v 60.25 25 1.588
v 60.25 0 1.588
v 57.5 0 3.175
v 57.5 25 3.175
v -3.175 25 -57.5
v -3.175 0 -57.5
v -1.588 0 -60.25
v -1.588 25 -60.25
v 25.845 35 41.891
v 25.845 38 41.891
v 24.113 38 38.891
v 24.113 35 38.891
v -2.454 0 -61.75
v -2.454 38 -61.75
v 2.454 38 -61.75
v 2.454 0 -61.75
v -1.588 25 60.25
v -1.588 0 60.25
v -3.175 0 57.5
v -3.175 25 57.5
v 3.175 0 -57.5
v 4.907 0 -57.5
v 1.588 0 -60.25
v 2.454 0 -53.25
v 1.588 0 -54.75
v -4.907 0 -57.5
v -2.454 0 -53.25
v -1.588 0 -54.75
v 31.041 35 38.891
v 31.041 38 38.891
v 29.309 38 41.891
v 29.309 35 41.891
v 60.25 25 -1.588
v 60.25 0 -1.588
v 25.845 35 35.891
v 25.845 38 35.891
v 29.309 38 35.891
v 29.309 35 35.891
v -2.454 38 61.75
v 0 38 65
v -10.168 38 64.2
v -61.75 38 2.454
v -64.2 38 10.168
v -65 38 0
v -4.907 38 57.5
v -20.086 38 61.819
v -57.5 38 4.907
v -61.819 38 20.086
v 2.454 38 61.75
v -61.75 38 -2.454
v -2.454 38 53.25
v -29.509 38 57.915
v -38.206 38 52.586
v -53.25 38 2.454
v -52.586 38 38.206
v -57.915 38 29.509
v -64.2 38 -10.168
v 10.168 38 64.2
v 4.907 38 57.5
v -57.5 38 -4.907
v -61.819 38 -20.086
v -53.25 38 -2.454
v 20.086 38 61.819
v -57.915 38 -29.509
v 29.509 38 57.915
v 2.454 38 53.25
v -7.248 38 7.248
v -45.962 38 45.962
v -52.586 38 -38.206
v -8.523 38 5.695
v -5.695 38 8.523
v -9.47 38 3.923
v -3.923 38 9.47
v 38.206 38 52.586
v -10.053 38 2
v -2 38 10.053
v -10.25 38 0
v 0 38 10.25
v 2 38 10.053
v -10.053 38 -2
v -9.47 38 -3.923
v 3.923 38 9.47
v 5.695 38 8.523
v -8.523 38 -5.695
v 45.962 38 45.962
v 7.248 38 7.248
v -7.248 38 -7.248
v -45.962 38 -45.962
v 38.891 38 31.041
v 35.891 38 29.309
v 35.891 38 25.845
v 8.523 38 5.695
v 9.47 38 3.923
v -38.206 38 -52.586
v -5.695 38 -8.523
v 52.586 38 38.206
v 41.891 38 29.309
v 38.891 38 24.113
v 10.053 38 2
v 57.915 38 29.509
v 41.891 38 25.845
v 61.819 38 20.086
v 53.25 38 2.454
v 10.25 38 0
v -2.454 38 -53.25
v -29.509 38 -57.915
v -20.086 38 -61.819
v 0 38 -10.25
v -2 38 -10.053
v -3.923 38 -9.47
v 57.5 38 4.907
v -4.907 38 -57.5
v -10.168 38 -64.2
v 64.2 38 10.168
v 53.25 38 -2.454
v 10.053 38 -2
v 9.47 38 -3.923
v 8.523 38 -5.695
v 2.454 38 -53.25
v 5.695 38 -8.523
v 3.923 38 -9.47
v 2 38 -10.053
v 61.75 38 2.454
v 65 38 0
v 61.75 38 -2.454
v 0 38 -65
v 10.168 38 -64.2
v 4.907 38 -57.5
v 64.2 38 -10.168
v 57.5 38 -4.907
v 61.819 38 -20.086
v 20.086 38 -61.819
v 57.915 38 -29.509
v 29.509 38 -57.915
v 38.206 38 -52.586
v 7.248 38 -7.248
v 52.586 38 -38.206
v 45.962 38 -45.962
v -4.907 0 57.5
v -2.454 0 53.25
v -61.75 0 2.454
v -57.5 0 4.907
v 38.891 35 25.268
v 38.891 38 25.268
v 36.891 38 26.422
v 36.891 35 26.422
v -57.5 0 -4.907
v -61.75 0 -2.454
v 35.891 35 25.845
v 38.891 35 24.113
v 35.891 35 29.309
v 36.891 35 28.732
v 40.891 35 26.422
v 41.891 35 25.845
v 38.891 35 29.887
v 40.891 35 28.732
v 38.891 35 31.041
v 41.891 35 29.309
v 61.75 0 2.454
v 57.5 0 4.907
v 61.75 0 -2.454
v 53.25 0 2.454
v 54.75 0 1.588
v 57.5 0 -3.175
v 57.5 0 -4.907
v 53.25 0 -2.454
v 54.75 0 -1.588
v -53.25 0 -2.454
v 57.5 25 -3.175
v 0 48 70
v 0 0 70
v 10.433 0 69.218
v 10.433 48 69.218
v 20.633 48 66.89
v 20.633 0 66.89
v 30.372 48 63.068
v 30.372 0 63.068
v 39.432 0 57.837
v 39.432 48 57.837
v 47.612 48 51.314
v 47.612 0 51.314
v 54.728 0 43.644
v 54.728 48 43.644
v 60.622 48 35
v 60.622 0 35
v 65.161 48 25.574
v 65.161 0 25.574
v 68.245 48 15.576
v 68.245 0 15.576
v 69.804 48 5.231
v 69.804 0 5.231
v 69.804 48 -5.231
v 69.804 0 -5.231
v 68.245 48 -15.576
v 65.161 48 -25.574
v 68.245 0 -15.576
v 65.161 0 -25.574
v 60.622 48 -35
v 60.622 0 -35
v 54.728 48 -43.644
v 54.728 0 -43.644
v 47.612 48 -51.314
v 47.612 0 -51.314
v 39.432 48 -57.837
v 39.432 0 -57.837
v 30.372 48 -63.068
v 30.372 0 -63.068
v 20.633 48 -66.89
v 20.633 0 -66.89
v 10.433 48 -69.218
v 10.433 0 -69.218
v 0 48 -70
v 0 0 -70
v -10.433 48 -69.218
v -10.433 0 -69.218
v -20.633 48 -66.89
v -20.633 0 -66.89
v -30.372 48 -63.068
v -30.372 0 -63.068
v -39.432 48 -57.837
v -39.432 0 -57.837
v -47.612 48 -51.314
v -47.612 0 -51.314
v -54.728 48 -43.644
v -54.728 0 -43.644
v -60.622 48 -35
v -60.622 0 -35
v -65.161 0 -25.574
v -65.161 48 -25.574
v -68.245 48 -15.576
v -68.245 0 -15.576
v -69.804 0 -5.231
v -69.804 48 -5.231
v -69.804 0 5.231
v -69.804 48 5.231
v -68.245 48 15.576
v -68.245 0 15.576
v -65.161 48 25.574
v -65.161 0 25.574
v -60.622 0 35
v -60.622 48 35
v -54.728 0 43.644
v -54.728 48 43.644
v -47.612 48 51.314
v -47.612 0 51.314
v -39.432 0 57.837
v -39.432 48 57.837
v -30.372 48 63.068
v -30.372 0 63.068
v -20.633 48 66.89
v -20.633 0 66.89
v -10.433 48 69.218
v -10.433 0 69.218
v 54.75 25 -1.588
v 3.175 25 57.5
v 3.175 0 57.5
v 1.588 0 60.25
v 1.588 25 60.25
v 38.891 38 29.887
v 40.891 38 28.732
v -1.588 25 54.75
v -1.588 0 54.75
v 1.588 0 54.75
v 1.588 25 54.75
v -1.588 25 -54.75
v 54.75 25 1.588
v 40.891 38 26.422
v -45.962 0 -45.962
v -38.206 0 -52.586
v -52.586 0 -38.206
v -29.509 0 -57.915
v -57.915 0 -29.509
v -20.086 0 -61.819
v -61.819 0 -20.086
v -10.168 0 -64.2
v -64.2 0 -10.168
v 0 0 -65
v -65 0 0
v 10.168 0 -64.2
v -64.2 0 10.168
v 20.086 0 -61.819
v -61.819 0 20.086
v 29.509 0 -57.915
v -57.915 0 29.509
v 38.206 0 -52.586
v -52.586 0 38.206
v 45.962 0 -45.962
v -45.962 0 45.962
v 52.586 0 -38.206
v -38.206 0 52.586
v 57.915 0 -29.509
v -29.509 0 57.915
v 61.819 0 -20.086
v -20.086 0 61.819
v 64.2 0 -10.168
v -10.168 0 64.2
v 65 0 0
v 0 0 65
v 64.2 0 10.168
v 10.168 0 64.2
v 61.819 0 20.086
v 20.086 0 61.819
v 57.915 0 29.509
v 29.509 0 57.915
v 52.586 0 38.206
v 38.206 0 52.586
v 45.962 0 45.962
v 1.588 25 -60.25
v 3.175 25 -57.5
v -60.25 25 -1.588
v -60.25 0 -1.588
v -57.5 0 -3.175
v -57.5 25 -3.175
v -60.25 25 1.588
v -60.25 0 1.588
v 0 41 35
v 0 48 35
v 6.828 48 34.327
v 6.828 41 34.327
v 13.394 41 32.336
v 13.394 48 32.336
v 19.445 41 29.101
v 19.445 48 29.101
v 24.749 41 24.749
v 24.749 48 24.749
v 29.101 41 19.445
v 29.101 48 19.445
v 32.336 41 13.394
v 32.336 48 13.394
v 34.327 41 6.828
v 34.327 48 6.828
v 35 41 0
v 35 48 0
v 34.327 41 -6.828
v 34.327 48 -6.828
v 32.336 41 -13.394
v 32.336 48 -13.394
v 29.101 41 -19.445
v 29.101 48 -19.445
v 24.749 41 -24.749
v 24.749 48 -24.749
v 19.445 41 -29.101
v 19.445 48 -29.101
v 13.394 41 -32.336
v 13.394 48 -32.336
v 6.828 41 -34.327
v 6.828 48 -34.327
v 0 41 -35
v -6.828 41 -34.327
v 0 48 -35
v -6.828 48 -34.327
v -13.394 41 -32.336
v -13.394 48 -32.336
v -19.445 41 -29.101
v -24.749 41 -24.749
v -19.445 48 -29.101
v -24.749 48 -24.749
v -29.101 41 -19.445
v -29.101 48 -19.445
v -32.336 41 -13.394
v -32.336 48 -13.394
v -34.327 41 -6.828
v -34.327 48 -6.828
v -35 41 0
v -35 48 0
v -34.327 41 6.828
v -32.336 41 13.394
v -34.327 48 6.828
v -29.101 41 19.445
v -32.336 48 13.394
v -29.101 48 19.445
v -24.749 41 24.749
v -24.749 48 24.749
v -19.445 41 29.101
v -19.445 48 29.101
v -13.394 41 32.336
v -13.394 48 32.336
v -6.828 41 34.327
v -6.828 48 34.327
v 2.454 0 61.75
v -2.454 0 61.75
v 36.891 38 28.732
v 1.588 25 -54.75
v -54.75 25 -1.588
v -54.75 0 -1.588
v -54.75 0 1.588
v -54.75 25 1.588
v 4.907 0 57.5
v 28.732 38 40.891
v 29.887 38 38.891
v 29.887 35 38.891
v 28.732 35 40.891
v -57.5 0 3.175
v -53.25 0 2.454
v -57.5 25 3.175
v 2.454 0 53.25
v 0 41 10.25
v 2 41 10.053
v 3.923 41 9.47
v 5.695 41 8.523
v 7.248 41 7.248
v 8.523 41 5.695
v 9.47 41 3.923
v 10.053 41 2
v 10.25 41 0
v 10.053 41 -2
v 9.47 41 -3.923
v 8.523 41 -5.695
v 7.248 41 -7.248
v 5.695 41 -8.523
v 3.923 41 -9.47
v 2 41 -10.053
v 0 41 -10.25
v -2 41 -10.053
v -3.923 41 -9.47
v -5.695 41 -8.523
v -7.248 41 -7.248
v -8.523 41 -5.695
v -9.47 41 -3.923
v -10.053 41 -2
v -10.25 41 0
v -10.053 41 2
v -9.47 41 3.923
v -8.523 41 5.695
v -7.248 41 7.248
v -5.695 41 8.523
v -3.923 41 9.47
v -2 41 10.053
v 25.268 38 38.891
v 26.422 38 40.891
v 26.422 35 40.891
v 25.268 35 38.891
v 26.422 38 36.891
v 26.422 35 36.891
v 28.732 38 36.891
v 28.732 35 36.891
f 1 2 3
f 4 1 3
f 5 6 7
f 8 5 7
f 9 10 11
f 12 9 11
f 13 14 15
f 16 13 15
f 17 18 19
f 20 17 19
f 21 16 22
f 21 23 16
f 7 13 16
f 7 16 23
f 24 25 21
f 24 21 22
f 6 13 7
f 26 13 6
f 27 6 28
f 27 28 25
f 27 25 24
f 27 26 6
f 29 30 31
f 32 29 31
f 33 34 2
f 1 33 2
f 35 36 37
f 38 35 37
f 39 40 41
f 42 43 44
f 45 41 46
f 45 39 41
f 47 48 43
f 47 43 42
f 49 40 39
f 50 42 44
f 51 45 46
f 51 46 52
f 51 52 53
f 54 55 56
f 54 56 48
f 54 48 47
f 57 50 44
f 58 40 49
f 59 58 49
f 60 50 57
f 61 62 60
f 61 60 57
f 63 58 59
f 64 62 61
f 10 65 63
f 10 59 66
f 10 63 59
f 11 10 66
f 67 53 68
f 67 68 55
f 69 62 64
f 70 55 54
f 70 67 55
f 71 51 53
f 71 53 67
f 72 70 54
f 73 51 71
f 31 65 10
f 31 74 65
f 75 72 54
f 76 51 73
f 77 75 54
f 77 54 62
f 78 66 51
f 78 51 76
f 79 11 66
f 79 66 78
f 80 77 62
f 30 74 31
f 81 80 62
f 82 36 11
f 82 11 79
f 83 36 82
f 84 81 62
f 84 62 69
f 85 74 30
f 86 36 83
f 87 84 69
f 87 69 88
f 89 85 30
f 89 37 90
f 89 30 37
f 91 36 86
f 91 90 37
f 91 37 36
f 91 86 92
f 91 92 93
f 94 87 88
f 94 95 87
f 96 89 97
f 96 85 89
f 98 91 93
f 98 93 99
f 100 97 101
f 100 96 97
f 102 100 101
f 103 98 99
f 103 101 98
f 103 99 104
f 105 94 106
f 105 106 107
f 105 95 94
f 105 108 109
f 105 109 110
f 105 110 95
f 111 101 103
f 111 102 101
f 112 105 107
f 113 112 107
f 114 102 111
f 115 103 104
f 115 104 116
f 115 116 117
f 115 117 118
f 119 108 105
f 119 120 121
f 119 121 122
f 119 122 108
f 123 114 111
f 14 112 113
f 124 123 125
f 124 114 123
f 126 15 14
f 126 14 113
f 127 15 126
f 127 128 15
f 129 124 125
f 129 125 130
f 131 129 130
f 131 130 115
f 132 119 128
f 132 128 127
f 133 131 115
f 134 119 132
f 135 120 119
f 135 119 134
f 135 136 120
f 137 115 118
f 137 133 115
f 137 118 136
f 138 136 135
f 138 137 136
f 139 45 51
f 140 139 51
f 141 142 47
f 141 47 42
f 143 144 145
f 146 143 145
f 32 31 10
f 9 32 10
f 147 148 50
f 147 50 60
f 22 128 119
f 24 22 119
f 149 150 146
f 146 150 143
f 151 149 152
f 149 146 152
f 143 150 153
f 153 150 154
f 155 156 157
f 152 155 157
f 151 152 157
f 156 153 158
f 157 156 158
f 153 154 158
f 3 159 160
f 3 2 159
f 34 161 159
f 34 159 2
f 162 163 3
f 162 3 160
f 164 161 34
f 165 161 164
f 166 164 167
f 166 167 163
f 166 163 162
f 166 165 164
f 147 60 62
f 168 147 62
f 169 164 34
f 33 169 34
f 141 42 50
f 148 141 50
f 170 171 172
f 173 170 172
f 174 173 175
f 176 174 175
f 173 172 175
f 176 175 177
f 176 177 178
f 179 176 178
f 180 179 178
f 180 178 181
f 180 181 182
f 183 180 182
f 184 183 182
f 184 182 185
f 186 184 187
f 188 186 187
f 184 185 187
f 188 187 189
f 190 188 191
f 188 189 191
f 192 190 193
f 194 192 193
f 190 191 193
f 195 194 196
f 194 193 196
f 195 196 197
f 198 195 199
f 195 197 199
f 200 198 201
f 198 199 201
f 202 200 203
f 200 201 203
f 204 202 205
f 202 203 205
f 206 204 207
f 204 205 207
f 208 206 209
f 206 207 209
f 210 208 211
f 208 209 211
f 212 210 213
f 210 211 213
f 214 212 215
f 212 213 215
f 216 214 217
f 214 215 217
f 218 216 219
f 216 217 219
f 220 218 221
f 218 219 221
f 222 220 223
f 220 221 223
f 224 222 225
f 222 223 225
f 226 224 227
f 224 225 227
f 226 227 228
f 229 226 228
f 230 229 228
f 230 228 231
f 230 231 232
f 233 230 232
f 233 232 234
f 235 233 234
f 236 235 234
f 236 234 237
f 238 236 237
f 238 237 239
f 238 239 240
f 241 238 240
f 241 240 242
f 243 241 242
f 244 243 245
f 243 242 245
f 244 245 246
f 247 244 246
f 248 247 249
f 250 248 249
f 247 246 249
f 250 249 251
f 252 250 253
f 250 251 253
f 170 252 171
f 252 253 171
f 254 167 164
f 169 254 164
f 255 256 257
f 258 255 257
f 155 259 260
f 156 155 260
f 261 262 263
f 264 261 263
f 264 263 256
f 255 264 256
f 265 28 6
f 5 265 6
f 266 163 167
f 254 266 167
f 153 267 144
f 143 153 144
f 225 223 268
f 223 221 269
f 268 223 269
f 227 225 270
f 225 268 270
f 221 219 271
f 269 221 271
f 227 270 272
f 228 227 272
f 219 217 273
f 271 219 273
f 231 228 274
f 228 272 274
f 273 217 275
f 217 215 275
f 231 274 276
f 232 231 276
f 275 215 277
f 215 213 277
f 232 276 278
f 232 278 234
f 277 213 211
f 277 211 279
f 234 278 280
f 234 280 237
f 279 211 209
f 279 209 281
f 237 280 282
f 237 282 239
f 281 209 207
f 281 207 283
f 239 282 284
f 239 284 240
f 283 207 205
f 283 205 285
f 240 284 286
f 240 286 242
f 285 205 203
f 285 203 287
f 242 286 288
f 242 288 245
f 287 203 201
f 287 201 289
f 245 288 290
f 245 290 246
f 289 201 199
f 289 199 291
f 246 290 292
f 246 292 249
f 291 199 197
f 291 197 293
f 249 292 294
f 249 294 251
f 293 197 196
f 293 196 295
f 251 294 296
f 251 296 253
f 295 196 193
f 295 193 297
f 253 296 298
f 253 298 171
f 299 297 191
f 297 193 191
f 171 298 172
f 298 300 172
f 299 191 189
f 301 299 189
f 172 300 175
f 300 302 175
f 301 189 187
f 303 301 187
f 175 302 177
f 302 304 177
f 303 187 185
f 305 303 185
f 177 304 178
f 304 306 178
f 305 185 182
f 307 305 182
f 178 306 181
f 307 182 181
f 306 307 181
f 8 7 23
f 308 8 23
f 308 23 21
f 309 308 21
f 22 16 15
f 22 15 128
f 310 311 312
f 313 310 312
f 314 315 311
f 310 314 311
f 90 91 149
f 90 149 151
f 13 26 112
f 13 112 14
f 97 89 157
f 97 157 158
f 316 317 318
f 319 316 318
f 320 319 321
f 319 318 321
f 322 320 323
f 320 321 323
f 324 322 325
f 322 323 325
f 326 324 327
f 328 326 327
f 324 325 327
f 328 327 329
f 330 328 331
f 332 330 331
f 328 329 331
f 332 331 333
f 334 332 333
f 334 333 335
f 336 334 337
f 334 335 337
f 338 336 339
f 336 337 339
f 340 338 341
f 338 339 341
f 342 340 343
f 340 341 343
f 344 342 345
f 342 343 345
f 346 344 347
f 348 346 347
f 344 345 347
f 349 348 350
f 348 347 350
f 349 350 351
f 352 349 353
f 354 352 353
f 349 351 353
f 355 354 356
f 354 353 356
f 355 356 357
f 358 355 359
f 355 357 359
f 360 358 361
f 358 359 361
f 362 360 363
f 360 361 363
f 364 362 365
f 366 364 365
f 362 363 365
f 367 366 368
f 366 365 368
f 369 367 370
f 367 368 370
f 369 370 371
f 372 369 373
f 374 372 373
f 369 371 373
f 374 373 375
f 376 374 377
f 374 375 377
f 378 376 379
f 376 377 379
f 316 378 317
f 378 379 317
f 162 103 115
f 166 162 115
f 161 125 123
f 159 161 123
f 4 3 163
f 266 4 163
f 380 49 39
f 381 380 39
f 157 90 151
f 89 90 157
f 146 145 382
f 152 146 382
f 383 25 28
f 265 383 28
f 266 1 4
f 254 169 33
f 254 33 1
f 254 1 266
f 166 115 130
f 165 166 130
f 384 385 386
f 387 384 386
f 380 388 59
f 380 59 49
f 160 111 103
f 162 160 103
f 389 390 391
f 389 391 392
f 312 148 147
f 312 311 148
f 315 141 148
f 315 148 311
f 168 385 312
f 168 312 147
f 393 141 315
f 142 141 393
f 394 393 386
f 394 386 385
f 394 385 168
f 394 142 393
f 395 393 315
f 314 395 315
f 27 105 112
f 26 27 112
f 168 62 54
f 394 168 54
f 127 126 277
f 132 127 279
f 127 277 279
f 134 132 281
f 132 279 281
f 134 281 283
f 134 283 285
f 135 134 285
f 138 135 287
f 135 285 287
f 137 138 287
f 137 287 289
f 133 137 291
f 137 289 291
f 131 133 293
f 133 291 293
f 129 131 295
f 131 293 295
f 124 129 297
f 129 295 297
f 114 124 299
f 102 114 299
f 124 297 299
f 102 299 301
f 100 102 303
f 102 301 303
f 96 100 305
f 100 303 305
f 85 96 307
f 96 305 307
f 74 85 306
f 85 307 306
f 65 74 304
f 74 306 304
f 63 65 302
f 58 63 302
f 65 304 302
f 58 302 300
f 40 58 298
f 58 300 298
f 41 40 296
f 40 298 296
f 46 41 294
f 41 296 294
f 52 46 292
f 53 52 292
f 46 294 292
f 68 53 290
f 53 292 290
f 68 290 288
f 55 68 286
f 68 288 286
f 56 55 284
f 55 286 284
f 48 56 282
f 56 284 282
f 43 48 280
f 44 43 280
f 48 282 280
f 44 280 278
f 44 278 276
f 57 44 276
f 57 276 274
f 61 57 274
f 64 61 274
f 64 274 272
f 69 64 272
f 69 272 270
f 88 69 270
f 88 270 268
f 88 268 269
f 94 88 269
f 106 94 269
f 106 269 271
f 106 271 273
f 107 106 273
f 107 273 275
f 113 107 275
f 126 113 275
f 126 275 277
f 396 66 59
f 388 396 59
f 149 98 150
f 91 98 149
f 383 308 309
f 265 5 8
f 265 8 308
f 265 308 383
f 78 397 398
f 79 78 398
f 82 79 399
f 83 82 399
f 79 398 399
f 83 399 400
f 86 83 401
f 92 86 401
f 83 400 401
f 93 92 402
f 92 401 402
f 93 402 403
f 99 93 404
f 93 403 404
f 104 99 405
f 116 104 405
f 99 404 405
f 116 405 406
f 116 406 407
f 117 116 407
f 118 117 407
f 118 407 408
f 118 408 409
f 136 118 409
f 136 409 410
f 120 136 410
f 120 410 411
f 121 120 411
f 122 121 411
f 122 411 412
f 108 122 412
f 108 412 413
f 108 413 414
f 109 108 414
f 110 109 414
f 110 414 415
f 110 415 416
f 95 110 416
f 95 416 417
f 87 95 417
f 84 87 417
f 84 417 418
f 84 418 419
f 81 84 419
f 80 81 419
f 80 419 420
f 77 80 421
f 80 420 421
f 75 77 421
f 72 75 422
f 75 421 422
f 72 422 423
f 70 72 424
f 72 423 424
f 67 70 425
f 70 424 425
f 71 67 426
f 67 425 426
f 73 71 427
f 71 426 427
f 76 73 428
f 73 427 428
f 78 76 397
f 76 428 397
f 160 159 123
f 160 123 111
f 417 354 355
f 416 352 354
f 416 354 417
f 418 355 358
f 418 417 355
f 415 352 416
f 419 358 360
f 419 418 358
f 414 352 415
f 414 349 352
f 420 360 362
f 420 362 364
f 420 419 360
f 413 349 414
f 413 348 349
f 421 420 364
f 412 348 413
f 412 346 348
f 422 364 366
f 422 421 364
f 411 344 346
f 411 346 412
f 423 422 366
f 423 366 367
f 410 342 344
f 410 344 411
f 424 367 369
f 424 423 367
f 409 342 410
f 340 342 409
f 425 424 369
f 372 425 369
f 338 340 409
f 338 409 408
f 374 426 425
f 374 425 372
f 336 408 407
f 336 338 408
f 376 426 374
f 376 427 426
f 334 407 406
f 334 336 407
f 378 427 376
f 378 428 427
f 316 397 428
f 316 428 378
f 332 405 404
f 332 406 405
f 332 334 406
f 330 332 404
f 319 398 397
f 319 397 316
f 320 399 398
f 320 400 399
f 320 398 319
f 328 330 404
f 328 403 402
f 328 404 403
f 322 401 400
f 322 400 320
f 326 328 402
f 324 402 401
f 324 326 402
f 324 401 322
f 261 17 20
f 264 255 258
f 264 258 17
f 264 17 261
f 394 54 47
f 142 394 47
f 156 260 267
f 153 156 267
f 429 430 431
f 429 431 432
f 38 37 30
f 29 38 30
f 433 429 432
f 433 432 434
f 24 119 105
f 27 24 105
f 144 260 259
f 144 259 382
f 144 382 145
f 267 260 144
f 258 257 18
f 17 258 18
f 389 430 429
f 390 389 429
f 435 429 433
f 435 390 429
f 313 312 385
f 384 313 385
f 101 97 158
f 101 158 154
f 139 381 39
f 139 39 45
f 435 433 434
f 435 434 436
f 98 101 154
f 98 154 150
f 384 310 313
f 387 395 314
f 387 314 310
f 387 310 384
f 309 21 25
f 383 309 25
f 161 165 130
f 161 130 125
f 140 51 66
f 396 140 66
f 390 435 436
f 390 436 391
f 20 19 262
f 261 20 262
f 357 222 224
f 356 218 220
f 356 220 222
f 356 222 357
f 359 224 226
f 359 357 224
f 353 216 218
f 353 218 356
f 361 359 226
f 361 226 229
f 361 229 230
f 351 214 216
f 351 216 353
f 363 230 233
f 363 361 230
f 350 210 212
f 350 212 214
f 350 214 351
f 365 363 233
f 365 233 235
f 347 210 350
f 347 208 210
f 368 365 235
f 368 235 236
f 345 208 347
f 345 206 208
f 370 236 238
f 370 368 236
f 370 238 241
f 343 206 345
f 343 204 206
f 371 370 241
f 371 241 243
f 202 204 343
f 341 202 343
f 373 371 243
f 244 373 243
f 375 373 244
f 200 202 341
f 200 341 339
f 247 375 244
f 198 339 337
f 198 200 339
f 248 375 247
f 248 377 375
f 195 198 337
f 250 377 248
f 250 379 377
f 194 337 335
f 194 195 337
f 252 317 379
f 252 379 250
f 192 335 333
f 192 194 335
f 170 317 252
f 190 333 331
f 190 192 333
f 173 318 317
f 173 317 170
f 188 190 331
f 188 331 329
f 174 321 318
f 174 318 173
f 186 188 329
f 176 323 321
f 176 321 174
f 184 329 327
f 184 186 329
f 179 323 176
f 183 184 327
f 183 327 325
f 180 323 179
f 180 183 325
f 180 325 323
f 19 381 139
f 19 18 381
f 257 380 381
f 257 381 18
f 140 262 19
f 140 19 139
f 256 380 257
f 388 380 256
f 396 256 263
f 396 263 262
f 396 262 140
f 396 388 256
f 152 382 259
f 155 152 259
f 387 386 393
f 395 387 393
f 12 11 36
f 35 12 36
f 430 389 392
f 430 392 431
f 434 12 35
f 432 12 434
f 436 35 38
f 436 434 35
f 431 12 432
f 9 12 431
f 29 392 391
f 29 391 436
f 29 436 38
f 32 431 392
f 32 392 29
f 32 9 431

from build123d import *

# Parameters (mm, degrees)
SKETCH1_R           = 70
BOSS_EXTRUDE1_DEPTH = 48
SKETCH2_R           = 35
CUT_EXTRUDE1_DEPTH  = 7
SKETCH3_R           = 10.25
CUT_EXTRUDE2_DEPTH  = 108.14942837
SKETCH4_R           = 65
CUT_EXTRUDE4_DEPTH  = 38
BOSS_EXTRUDE2_DEPTH = 38
CUT_EXTRUDE5_DEPTH  = 25
CIRPATTERN1_COUNT   = 4
BOSS_EXTRUDE3_DEPTH = 3


with BuildPart() as part:
    # Sketch1 → Boss-Extrude1 (new body)
    with BuildSketch(Plane(origin=(0, 0, 0), x_dir=(1, 0, 0), z_dir=(0, 1, 0))):
        with Locations(Location((0, 0, 0), (0, 0, 270))):
            Circle(SKETCH1_R)
    extrude(amount=BOSS_EXTRUDE1_DEPTH)

    # Sketch2 → Cut-Extrude1 (cut)
    with BuildSketch(Plane(origin=(0, 48, 0), x_dir=(1, 0, 0), z_dir=(0, 1, 0))):
        with Locations(Location((0, 0, 0), (0, 0, 270))):
            Circle(SKETCH2_R)
    extrude(amount=-CUT_EXTRUDE1_DEPTH, mode=Mode.SUBTRACT)

    # Sketch3 → Cut-Extrude2 (cut, through all)
    with BuildSketch(Plane(origin=(0, 41, 0), x_dir=(1, 0, 0), z_dir=(0, 1, 0))):
        with Locations(Location((0, 0, 0), (0, 0, 270))):
            Circle(SKETCH3_R)
    extrude(amount=-CUT_EXTRUDE2_DEPTH, mode=Mode.SUBTRACT)

    # Sketch4 → Cut-Extrude4 (cut)
    with BuildSketch(Plane.XZ):
        with Locations(Location((0, 0, 0), (0, 0, 270))):
            Circle(SKETCH4_R)
    extrude(amount=-CUT_EXTRUDE4_DEPTH, mode=Mode.SUBTRACT)

    # Sketch7 → Boss-Extrude2 (add)
    with BuildSketch(Plane.XZ.offset(-38)):
        Polygon((-57.5, 4.907477288), (-61.75, 2.453738644), (-61.75, -2.453738644), (-57.5, -4.907477288), (-53.25, -2.453738644), (-53.25, 2.453738644), align=None)
    boss_extrude2 = extrude(amount=BOSS_EXTRUDE2_DEPTH)

    # Sketch10 → Cut-Extrude5 (cut)
    with BuildSketch(Plane.XZ):
        Polygon((-57.5, 3.175426481), (-60.25, 1.58771324), (-60.25, -1.58771324), (-57.5, -3.175426481), (-54.75, -1.58771324), (-54.75, 1.58771324), align=None)
    cut_extrude5 = extrude(amount=-CUT_EXTRUDE5_DEPTH, mode=Mode.SUBTRACT)

    # CirPattern1: Boss-Extrude2, Cut-Extrude5 ×4 about axis
    cirpattern1_axis = Axis((0, 0, 0), (0, 1, 0))
    add([boss_extrude2.rotate(cirpattern1_axis, i * 360 / CIRPATTERN1_COUNT) for i in range(1, CIRPATTERN1_COUNT)])
    add([cut_extrude5.rotate(cirpattern1_axis, i * 360 / CIRPATTERN1_COUNT) for i in range(1, CIRPATTERN1_COUNT)], mode=Mode.SUBTRACT)

    # Sketch14 → Boss-Extrude3 (add)
    with BuildSketch(Plane.XZ.offset(-38)):
        Polygon((31.041266081, 38.890872965), (29.309215274, 41.890872965), (25.845113659, 41.890872965), (24.113062851, 38.890872965), (25.845113659, 35.890872965), (29.309215274, 35.890872965), align=None)
        Polygon((25.26776339, 38.890872965), (26.422463928, 36.890872965), (28.731865005, 36.890872965), (29.886565543, 38.890872965), (28.731865005, 40.890872965), (26.422463928, 40.890872965), align=None, mode=Mode.SUBTRACT)
    boss_extrude3 = extrude(amount=BOSS_EXTRUDE3_DEPTH)

    # Mirror1: Boss-Extrude3 across plane
    add(boss_extrude3.mirror(Plane(origin=(0, 0, 0), x_dir=(0.7071067811865436, 0, 0.7071067811865515), z_dir=(-0.7071067811865515, 0, 0.7071067811865436))))


solid = part.part
